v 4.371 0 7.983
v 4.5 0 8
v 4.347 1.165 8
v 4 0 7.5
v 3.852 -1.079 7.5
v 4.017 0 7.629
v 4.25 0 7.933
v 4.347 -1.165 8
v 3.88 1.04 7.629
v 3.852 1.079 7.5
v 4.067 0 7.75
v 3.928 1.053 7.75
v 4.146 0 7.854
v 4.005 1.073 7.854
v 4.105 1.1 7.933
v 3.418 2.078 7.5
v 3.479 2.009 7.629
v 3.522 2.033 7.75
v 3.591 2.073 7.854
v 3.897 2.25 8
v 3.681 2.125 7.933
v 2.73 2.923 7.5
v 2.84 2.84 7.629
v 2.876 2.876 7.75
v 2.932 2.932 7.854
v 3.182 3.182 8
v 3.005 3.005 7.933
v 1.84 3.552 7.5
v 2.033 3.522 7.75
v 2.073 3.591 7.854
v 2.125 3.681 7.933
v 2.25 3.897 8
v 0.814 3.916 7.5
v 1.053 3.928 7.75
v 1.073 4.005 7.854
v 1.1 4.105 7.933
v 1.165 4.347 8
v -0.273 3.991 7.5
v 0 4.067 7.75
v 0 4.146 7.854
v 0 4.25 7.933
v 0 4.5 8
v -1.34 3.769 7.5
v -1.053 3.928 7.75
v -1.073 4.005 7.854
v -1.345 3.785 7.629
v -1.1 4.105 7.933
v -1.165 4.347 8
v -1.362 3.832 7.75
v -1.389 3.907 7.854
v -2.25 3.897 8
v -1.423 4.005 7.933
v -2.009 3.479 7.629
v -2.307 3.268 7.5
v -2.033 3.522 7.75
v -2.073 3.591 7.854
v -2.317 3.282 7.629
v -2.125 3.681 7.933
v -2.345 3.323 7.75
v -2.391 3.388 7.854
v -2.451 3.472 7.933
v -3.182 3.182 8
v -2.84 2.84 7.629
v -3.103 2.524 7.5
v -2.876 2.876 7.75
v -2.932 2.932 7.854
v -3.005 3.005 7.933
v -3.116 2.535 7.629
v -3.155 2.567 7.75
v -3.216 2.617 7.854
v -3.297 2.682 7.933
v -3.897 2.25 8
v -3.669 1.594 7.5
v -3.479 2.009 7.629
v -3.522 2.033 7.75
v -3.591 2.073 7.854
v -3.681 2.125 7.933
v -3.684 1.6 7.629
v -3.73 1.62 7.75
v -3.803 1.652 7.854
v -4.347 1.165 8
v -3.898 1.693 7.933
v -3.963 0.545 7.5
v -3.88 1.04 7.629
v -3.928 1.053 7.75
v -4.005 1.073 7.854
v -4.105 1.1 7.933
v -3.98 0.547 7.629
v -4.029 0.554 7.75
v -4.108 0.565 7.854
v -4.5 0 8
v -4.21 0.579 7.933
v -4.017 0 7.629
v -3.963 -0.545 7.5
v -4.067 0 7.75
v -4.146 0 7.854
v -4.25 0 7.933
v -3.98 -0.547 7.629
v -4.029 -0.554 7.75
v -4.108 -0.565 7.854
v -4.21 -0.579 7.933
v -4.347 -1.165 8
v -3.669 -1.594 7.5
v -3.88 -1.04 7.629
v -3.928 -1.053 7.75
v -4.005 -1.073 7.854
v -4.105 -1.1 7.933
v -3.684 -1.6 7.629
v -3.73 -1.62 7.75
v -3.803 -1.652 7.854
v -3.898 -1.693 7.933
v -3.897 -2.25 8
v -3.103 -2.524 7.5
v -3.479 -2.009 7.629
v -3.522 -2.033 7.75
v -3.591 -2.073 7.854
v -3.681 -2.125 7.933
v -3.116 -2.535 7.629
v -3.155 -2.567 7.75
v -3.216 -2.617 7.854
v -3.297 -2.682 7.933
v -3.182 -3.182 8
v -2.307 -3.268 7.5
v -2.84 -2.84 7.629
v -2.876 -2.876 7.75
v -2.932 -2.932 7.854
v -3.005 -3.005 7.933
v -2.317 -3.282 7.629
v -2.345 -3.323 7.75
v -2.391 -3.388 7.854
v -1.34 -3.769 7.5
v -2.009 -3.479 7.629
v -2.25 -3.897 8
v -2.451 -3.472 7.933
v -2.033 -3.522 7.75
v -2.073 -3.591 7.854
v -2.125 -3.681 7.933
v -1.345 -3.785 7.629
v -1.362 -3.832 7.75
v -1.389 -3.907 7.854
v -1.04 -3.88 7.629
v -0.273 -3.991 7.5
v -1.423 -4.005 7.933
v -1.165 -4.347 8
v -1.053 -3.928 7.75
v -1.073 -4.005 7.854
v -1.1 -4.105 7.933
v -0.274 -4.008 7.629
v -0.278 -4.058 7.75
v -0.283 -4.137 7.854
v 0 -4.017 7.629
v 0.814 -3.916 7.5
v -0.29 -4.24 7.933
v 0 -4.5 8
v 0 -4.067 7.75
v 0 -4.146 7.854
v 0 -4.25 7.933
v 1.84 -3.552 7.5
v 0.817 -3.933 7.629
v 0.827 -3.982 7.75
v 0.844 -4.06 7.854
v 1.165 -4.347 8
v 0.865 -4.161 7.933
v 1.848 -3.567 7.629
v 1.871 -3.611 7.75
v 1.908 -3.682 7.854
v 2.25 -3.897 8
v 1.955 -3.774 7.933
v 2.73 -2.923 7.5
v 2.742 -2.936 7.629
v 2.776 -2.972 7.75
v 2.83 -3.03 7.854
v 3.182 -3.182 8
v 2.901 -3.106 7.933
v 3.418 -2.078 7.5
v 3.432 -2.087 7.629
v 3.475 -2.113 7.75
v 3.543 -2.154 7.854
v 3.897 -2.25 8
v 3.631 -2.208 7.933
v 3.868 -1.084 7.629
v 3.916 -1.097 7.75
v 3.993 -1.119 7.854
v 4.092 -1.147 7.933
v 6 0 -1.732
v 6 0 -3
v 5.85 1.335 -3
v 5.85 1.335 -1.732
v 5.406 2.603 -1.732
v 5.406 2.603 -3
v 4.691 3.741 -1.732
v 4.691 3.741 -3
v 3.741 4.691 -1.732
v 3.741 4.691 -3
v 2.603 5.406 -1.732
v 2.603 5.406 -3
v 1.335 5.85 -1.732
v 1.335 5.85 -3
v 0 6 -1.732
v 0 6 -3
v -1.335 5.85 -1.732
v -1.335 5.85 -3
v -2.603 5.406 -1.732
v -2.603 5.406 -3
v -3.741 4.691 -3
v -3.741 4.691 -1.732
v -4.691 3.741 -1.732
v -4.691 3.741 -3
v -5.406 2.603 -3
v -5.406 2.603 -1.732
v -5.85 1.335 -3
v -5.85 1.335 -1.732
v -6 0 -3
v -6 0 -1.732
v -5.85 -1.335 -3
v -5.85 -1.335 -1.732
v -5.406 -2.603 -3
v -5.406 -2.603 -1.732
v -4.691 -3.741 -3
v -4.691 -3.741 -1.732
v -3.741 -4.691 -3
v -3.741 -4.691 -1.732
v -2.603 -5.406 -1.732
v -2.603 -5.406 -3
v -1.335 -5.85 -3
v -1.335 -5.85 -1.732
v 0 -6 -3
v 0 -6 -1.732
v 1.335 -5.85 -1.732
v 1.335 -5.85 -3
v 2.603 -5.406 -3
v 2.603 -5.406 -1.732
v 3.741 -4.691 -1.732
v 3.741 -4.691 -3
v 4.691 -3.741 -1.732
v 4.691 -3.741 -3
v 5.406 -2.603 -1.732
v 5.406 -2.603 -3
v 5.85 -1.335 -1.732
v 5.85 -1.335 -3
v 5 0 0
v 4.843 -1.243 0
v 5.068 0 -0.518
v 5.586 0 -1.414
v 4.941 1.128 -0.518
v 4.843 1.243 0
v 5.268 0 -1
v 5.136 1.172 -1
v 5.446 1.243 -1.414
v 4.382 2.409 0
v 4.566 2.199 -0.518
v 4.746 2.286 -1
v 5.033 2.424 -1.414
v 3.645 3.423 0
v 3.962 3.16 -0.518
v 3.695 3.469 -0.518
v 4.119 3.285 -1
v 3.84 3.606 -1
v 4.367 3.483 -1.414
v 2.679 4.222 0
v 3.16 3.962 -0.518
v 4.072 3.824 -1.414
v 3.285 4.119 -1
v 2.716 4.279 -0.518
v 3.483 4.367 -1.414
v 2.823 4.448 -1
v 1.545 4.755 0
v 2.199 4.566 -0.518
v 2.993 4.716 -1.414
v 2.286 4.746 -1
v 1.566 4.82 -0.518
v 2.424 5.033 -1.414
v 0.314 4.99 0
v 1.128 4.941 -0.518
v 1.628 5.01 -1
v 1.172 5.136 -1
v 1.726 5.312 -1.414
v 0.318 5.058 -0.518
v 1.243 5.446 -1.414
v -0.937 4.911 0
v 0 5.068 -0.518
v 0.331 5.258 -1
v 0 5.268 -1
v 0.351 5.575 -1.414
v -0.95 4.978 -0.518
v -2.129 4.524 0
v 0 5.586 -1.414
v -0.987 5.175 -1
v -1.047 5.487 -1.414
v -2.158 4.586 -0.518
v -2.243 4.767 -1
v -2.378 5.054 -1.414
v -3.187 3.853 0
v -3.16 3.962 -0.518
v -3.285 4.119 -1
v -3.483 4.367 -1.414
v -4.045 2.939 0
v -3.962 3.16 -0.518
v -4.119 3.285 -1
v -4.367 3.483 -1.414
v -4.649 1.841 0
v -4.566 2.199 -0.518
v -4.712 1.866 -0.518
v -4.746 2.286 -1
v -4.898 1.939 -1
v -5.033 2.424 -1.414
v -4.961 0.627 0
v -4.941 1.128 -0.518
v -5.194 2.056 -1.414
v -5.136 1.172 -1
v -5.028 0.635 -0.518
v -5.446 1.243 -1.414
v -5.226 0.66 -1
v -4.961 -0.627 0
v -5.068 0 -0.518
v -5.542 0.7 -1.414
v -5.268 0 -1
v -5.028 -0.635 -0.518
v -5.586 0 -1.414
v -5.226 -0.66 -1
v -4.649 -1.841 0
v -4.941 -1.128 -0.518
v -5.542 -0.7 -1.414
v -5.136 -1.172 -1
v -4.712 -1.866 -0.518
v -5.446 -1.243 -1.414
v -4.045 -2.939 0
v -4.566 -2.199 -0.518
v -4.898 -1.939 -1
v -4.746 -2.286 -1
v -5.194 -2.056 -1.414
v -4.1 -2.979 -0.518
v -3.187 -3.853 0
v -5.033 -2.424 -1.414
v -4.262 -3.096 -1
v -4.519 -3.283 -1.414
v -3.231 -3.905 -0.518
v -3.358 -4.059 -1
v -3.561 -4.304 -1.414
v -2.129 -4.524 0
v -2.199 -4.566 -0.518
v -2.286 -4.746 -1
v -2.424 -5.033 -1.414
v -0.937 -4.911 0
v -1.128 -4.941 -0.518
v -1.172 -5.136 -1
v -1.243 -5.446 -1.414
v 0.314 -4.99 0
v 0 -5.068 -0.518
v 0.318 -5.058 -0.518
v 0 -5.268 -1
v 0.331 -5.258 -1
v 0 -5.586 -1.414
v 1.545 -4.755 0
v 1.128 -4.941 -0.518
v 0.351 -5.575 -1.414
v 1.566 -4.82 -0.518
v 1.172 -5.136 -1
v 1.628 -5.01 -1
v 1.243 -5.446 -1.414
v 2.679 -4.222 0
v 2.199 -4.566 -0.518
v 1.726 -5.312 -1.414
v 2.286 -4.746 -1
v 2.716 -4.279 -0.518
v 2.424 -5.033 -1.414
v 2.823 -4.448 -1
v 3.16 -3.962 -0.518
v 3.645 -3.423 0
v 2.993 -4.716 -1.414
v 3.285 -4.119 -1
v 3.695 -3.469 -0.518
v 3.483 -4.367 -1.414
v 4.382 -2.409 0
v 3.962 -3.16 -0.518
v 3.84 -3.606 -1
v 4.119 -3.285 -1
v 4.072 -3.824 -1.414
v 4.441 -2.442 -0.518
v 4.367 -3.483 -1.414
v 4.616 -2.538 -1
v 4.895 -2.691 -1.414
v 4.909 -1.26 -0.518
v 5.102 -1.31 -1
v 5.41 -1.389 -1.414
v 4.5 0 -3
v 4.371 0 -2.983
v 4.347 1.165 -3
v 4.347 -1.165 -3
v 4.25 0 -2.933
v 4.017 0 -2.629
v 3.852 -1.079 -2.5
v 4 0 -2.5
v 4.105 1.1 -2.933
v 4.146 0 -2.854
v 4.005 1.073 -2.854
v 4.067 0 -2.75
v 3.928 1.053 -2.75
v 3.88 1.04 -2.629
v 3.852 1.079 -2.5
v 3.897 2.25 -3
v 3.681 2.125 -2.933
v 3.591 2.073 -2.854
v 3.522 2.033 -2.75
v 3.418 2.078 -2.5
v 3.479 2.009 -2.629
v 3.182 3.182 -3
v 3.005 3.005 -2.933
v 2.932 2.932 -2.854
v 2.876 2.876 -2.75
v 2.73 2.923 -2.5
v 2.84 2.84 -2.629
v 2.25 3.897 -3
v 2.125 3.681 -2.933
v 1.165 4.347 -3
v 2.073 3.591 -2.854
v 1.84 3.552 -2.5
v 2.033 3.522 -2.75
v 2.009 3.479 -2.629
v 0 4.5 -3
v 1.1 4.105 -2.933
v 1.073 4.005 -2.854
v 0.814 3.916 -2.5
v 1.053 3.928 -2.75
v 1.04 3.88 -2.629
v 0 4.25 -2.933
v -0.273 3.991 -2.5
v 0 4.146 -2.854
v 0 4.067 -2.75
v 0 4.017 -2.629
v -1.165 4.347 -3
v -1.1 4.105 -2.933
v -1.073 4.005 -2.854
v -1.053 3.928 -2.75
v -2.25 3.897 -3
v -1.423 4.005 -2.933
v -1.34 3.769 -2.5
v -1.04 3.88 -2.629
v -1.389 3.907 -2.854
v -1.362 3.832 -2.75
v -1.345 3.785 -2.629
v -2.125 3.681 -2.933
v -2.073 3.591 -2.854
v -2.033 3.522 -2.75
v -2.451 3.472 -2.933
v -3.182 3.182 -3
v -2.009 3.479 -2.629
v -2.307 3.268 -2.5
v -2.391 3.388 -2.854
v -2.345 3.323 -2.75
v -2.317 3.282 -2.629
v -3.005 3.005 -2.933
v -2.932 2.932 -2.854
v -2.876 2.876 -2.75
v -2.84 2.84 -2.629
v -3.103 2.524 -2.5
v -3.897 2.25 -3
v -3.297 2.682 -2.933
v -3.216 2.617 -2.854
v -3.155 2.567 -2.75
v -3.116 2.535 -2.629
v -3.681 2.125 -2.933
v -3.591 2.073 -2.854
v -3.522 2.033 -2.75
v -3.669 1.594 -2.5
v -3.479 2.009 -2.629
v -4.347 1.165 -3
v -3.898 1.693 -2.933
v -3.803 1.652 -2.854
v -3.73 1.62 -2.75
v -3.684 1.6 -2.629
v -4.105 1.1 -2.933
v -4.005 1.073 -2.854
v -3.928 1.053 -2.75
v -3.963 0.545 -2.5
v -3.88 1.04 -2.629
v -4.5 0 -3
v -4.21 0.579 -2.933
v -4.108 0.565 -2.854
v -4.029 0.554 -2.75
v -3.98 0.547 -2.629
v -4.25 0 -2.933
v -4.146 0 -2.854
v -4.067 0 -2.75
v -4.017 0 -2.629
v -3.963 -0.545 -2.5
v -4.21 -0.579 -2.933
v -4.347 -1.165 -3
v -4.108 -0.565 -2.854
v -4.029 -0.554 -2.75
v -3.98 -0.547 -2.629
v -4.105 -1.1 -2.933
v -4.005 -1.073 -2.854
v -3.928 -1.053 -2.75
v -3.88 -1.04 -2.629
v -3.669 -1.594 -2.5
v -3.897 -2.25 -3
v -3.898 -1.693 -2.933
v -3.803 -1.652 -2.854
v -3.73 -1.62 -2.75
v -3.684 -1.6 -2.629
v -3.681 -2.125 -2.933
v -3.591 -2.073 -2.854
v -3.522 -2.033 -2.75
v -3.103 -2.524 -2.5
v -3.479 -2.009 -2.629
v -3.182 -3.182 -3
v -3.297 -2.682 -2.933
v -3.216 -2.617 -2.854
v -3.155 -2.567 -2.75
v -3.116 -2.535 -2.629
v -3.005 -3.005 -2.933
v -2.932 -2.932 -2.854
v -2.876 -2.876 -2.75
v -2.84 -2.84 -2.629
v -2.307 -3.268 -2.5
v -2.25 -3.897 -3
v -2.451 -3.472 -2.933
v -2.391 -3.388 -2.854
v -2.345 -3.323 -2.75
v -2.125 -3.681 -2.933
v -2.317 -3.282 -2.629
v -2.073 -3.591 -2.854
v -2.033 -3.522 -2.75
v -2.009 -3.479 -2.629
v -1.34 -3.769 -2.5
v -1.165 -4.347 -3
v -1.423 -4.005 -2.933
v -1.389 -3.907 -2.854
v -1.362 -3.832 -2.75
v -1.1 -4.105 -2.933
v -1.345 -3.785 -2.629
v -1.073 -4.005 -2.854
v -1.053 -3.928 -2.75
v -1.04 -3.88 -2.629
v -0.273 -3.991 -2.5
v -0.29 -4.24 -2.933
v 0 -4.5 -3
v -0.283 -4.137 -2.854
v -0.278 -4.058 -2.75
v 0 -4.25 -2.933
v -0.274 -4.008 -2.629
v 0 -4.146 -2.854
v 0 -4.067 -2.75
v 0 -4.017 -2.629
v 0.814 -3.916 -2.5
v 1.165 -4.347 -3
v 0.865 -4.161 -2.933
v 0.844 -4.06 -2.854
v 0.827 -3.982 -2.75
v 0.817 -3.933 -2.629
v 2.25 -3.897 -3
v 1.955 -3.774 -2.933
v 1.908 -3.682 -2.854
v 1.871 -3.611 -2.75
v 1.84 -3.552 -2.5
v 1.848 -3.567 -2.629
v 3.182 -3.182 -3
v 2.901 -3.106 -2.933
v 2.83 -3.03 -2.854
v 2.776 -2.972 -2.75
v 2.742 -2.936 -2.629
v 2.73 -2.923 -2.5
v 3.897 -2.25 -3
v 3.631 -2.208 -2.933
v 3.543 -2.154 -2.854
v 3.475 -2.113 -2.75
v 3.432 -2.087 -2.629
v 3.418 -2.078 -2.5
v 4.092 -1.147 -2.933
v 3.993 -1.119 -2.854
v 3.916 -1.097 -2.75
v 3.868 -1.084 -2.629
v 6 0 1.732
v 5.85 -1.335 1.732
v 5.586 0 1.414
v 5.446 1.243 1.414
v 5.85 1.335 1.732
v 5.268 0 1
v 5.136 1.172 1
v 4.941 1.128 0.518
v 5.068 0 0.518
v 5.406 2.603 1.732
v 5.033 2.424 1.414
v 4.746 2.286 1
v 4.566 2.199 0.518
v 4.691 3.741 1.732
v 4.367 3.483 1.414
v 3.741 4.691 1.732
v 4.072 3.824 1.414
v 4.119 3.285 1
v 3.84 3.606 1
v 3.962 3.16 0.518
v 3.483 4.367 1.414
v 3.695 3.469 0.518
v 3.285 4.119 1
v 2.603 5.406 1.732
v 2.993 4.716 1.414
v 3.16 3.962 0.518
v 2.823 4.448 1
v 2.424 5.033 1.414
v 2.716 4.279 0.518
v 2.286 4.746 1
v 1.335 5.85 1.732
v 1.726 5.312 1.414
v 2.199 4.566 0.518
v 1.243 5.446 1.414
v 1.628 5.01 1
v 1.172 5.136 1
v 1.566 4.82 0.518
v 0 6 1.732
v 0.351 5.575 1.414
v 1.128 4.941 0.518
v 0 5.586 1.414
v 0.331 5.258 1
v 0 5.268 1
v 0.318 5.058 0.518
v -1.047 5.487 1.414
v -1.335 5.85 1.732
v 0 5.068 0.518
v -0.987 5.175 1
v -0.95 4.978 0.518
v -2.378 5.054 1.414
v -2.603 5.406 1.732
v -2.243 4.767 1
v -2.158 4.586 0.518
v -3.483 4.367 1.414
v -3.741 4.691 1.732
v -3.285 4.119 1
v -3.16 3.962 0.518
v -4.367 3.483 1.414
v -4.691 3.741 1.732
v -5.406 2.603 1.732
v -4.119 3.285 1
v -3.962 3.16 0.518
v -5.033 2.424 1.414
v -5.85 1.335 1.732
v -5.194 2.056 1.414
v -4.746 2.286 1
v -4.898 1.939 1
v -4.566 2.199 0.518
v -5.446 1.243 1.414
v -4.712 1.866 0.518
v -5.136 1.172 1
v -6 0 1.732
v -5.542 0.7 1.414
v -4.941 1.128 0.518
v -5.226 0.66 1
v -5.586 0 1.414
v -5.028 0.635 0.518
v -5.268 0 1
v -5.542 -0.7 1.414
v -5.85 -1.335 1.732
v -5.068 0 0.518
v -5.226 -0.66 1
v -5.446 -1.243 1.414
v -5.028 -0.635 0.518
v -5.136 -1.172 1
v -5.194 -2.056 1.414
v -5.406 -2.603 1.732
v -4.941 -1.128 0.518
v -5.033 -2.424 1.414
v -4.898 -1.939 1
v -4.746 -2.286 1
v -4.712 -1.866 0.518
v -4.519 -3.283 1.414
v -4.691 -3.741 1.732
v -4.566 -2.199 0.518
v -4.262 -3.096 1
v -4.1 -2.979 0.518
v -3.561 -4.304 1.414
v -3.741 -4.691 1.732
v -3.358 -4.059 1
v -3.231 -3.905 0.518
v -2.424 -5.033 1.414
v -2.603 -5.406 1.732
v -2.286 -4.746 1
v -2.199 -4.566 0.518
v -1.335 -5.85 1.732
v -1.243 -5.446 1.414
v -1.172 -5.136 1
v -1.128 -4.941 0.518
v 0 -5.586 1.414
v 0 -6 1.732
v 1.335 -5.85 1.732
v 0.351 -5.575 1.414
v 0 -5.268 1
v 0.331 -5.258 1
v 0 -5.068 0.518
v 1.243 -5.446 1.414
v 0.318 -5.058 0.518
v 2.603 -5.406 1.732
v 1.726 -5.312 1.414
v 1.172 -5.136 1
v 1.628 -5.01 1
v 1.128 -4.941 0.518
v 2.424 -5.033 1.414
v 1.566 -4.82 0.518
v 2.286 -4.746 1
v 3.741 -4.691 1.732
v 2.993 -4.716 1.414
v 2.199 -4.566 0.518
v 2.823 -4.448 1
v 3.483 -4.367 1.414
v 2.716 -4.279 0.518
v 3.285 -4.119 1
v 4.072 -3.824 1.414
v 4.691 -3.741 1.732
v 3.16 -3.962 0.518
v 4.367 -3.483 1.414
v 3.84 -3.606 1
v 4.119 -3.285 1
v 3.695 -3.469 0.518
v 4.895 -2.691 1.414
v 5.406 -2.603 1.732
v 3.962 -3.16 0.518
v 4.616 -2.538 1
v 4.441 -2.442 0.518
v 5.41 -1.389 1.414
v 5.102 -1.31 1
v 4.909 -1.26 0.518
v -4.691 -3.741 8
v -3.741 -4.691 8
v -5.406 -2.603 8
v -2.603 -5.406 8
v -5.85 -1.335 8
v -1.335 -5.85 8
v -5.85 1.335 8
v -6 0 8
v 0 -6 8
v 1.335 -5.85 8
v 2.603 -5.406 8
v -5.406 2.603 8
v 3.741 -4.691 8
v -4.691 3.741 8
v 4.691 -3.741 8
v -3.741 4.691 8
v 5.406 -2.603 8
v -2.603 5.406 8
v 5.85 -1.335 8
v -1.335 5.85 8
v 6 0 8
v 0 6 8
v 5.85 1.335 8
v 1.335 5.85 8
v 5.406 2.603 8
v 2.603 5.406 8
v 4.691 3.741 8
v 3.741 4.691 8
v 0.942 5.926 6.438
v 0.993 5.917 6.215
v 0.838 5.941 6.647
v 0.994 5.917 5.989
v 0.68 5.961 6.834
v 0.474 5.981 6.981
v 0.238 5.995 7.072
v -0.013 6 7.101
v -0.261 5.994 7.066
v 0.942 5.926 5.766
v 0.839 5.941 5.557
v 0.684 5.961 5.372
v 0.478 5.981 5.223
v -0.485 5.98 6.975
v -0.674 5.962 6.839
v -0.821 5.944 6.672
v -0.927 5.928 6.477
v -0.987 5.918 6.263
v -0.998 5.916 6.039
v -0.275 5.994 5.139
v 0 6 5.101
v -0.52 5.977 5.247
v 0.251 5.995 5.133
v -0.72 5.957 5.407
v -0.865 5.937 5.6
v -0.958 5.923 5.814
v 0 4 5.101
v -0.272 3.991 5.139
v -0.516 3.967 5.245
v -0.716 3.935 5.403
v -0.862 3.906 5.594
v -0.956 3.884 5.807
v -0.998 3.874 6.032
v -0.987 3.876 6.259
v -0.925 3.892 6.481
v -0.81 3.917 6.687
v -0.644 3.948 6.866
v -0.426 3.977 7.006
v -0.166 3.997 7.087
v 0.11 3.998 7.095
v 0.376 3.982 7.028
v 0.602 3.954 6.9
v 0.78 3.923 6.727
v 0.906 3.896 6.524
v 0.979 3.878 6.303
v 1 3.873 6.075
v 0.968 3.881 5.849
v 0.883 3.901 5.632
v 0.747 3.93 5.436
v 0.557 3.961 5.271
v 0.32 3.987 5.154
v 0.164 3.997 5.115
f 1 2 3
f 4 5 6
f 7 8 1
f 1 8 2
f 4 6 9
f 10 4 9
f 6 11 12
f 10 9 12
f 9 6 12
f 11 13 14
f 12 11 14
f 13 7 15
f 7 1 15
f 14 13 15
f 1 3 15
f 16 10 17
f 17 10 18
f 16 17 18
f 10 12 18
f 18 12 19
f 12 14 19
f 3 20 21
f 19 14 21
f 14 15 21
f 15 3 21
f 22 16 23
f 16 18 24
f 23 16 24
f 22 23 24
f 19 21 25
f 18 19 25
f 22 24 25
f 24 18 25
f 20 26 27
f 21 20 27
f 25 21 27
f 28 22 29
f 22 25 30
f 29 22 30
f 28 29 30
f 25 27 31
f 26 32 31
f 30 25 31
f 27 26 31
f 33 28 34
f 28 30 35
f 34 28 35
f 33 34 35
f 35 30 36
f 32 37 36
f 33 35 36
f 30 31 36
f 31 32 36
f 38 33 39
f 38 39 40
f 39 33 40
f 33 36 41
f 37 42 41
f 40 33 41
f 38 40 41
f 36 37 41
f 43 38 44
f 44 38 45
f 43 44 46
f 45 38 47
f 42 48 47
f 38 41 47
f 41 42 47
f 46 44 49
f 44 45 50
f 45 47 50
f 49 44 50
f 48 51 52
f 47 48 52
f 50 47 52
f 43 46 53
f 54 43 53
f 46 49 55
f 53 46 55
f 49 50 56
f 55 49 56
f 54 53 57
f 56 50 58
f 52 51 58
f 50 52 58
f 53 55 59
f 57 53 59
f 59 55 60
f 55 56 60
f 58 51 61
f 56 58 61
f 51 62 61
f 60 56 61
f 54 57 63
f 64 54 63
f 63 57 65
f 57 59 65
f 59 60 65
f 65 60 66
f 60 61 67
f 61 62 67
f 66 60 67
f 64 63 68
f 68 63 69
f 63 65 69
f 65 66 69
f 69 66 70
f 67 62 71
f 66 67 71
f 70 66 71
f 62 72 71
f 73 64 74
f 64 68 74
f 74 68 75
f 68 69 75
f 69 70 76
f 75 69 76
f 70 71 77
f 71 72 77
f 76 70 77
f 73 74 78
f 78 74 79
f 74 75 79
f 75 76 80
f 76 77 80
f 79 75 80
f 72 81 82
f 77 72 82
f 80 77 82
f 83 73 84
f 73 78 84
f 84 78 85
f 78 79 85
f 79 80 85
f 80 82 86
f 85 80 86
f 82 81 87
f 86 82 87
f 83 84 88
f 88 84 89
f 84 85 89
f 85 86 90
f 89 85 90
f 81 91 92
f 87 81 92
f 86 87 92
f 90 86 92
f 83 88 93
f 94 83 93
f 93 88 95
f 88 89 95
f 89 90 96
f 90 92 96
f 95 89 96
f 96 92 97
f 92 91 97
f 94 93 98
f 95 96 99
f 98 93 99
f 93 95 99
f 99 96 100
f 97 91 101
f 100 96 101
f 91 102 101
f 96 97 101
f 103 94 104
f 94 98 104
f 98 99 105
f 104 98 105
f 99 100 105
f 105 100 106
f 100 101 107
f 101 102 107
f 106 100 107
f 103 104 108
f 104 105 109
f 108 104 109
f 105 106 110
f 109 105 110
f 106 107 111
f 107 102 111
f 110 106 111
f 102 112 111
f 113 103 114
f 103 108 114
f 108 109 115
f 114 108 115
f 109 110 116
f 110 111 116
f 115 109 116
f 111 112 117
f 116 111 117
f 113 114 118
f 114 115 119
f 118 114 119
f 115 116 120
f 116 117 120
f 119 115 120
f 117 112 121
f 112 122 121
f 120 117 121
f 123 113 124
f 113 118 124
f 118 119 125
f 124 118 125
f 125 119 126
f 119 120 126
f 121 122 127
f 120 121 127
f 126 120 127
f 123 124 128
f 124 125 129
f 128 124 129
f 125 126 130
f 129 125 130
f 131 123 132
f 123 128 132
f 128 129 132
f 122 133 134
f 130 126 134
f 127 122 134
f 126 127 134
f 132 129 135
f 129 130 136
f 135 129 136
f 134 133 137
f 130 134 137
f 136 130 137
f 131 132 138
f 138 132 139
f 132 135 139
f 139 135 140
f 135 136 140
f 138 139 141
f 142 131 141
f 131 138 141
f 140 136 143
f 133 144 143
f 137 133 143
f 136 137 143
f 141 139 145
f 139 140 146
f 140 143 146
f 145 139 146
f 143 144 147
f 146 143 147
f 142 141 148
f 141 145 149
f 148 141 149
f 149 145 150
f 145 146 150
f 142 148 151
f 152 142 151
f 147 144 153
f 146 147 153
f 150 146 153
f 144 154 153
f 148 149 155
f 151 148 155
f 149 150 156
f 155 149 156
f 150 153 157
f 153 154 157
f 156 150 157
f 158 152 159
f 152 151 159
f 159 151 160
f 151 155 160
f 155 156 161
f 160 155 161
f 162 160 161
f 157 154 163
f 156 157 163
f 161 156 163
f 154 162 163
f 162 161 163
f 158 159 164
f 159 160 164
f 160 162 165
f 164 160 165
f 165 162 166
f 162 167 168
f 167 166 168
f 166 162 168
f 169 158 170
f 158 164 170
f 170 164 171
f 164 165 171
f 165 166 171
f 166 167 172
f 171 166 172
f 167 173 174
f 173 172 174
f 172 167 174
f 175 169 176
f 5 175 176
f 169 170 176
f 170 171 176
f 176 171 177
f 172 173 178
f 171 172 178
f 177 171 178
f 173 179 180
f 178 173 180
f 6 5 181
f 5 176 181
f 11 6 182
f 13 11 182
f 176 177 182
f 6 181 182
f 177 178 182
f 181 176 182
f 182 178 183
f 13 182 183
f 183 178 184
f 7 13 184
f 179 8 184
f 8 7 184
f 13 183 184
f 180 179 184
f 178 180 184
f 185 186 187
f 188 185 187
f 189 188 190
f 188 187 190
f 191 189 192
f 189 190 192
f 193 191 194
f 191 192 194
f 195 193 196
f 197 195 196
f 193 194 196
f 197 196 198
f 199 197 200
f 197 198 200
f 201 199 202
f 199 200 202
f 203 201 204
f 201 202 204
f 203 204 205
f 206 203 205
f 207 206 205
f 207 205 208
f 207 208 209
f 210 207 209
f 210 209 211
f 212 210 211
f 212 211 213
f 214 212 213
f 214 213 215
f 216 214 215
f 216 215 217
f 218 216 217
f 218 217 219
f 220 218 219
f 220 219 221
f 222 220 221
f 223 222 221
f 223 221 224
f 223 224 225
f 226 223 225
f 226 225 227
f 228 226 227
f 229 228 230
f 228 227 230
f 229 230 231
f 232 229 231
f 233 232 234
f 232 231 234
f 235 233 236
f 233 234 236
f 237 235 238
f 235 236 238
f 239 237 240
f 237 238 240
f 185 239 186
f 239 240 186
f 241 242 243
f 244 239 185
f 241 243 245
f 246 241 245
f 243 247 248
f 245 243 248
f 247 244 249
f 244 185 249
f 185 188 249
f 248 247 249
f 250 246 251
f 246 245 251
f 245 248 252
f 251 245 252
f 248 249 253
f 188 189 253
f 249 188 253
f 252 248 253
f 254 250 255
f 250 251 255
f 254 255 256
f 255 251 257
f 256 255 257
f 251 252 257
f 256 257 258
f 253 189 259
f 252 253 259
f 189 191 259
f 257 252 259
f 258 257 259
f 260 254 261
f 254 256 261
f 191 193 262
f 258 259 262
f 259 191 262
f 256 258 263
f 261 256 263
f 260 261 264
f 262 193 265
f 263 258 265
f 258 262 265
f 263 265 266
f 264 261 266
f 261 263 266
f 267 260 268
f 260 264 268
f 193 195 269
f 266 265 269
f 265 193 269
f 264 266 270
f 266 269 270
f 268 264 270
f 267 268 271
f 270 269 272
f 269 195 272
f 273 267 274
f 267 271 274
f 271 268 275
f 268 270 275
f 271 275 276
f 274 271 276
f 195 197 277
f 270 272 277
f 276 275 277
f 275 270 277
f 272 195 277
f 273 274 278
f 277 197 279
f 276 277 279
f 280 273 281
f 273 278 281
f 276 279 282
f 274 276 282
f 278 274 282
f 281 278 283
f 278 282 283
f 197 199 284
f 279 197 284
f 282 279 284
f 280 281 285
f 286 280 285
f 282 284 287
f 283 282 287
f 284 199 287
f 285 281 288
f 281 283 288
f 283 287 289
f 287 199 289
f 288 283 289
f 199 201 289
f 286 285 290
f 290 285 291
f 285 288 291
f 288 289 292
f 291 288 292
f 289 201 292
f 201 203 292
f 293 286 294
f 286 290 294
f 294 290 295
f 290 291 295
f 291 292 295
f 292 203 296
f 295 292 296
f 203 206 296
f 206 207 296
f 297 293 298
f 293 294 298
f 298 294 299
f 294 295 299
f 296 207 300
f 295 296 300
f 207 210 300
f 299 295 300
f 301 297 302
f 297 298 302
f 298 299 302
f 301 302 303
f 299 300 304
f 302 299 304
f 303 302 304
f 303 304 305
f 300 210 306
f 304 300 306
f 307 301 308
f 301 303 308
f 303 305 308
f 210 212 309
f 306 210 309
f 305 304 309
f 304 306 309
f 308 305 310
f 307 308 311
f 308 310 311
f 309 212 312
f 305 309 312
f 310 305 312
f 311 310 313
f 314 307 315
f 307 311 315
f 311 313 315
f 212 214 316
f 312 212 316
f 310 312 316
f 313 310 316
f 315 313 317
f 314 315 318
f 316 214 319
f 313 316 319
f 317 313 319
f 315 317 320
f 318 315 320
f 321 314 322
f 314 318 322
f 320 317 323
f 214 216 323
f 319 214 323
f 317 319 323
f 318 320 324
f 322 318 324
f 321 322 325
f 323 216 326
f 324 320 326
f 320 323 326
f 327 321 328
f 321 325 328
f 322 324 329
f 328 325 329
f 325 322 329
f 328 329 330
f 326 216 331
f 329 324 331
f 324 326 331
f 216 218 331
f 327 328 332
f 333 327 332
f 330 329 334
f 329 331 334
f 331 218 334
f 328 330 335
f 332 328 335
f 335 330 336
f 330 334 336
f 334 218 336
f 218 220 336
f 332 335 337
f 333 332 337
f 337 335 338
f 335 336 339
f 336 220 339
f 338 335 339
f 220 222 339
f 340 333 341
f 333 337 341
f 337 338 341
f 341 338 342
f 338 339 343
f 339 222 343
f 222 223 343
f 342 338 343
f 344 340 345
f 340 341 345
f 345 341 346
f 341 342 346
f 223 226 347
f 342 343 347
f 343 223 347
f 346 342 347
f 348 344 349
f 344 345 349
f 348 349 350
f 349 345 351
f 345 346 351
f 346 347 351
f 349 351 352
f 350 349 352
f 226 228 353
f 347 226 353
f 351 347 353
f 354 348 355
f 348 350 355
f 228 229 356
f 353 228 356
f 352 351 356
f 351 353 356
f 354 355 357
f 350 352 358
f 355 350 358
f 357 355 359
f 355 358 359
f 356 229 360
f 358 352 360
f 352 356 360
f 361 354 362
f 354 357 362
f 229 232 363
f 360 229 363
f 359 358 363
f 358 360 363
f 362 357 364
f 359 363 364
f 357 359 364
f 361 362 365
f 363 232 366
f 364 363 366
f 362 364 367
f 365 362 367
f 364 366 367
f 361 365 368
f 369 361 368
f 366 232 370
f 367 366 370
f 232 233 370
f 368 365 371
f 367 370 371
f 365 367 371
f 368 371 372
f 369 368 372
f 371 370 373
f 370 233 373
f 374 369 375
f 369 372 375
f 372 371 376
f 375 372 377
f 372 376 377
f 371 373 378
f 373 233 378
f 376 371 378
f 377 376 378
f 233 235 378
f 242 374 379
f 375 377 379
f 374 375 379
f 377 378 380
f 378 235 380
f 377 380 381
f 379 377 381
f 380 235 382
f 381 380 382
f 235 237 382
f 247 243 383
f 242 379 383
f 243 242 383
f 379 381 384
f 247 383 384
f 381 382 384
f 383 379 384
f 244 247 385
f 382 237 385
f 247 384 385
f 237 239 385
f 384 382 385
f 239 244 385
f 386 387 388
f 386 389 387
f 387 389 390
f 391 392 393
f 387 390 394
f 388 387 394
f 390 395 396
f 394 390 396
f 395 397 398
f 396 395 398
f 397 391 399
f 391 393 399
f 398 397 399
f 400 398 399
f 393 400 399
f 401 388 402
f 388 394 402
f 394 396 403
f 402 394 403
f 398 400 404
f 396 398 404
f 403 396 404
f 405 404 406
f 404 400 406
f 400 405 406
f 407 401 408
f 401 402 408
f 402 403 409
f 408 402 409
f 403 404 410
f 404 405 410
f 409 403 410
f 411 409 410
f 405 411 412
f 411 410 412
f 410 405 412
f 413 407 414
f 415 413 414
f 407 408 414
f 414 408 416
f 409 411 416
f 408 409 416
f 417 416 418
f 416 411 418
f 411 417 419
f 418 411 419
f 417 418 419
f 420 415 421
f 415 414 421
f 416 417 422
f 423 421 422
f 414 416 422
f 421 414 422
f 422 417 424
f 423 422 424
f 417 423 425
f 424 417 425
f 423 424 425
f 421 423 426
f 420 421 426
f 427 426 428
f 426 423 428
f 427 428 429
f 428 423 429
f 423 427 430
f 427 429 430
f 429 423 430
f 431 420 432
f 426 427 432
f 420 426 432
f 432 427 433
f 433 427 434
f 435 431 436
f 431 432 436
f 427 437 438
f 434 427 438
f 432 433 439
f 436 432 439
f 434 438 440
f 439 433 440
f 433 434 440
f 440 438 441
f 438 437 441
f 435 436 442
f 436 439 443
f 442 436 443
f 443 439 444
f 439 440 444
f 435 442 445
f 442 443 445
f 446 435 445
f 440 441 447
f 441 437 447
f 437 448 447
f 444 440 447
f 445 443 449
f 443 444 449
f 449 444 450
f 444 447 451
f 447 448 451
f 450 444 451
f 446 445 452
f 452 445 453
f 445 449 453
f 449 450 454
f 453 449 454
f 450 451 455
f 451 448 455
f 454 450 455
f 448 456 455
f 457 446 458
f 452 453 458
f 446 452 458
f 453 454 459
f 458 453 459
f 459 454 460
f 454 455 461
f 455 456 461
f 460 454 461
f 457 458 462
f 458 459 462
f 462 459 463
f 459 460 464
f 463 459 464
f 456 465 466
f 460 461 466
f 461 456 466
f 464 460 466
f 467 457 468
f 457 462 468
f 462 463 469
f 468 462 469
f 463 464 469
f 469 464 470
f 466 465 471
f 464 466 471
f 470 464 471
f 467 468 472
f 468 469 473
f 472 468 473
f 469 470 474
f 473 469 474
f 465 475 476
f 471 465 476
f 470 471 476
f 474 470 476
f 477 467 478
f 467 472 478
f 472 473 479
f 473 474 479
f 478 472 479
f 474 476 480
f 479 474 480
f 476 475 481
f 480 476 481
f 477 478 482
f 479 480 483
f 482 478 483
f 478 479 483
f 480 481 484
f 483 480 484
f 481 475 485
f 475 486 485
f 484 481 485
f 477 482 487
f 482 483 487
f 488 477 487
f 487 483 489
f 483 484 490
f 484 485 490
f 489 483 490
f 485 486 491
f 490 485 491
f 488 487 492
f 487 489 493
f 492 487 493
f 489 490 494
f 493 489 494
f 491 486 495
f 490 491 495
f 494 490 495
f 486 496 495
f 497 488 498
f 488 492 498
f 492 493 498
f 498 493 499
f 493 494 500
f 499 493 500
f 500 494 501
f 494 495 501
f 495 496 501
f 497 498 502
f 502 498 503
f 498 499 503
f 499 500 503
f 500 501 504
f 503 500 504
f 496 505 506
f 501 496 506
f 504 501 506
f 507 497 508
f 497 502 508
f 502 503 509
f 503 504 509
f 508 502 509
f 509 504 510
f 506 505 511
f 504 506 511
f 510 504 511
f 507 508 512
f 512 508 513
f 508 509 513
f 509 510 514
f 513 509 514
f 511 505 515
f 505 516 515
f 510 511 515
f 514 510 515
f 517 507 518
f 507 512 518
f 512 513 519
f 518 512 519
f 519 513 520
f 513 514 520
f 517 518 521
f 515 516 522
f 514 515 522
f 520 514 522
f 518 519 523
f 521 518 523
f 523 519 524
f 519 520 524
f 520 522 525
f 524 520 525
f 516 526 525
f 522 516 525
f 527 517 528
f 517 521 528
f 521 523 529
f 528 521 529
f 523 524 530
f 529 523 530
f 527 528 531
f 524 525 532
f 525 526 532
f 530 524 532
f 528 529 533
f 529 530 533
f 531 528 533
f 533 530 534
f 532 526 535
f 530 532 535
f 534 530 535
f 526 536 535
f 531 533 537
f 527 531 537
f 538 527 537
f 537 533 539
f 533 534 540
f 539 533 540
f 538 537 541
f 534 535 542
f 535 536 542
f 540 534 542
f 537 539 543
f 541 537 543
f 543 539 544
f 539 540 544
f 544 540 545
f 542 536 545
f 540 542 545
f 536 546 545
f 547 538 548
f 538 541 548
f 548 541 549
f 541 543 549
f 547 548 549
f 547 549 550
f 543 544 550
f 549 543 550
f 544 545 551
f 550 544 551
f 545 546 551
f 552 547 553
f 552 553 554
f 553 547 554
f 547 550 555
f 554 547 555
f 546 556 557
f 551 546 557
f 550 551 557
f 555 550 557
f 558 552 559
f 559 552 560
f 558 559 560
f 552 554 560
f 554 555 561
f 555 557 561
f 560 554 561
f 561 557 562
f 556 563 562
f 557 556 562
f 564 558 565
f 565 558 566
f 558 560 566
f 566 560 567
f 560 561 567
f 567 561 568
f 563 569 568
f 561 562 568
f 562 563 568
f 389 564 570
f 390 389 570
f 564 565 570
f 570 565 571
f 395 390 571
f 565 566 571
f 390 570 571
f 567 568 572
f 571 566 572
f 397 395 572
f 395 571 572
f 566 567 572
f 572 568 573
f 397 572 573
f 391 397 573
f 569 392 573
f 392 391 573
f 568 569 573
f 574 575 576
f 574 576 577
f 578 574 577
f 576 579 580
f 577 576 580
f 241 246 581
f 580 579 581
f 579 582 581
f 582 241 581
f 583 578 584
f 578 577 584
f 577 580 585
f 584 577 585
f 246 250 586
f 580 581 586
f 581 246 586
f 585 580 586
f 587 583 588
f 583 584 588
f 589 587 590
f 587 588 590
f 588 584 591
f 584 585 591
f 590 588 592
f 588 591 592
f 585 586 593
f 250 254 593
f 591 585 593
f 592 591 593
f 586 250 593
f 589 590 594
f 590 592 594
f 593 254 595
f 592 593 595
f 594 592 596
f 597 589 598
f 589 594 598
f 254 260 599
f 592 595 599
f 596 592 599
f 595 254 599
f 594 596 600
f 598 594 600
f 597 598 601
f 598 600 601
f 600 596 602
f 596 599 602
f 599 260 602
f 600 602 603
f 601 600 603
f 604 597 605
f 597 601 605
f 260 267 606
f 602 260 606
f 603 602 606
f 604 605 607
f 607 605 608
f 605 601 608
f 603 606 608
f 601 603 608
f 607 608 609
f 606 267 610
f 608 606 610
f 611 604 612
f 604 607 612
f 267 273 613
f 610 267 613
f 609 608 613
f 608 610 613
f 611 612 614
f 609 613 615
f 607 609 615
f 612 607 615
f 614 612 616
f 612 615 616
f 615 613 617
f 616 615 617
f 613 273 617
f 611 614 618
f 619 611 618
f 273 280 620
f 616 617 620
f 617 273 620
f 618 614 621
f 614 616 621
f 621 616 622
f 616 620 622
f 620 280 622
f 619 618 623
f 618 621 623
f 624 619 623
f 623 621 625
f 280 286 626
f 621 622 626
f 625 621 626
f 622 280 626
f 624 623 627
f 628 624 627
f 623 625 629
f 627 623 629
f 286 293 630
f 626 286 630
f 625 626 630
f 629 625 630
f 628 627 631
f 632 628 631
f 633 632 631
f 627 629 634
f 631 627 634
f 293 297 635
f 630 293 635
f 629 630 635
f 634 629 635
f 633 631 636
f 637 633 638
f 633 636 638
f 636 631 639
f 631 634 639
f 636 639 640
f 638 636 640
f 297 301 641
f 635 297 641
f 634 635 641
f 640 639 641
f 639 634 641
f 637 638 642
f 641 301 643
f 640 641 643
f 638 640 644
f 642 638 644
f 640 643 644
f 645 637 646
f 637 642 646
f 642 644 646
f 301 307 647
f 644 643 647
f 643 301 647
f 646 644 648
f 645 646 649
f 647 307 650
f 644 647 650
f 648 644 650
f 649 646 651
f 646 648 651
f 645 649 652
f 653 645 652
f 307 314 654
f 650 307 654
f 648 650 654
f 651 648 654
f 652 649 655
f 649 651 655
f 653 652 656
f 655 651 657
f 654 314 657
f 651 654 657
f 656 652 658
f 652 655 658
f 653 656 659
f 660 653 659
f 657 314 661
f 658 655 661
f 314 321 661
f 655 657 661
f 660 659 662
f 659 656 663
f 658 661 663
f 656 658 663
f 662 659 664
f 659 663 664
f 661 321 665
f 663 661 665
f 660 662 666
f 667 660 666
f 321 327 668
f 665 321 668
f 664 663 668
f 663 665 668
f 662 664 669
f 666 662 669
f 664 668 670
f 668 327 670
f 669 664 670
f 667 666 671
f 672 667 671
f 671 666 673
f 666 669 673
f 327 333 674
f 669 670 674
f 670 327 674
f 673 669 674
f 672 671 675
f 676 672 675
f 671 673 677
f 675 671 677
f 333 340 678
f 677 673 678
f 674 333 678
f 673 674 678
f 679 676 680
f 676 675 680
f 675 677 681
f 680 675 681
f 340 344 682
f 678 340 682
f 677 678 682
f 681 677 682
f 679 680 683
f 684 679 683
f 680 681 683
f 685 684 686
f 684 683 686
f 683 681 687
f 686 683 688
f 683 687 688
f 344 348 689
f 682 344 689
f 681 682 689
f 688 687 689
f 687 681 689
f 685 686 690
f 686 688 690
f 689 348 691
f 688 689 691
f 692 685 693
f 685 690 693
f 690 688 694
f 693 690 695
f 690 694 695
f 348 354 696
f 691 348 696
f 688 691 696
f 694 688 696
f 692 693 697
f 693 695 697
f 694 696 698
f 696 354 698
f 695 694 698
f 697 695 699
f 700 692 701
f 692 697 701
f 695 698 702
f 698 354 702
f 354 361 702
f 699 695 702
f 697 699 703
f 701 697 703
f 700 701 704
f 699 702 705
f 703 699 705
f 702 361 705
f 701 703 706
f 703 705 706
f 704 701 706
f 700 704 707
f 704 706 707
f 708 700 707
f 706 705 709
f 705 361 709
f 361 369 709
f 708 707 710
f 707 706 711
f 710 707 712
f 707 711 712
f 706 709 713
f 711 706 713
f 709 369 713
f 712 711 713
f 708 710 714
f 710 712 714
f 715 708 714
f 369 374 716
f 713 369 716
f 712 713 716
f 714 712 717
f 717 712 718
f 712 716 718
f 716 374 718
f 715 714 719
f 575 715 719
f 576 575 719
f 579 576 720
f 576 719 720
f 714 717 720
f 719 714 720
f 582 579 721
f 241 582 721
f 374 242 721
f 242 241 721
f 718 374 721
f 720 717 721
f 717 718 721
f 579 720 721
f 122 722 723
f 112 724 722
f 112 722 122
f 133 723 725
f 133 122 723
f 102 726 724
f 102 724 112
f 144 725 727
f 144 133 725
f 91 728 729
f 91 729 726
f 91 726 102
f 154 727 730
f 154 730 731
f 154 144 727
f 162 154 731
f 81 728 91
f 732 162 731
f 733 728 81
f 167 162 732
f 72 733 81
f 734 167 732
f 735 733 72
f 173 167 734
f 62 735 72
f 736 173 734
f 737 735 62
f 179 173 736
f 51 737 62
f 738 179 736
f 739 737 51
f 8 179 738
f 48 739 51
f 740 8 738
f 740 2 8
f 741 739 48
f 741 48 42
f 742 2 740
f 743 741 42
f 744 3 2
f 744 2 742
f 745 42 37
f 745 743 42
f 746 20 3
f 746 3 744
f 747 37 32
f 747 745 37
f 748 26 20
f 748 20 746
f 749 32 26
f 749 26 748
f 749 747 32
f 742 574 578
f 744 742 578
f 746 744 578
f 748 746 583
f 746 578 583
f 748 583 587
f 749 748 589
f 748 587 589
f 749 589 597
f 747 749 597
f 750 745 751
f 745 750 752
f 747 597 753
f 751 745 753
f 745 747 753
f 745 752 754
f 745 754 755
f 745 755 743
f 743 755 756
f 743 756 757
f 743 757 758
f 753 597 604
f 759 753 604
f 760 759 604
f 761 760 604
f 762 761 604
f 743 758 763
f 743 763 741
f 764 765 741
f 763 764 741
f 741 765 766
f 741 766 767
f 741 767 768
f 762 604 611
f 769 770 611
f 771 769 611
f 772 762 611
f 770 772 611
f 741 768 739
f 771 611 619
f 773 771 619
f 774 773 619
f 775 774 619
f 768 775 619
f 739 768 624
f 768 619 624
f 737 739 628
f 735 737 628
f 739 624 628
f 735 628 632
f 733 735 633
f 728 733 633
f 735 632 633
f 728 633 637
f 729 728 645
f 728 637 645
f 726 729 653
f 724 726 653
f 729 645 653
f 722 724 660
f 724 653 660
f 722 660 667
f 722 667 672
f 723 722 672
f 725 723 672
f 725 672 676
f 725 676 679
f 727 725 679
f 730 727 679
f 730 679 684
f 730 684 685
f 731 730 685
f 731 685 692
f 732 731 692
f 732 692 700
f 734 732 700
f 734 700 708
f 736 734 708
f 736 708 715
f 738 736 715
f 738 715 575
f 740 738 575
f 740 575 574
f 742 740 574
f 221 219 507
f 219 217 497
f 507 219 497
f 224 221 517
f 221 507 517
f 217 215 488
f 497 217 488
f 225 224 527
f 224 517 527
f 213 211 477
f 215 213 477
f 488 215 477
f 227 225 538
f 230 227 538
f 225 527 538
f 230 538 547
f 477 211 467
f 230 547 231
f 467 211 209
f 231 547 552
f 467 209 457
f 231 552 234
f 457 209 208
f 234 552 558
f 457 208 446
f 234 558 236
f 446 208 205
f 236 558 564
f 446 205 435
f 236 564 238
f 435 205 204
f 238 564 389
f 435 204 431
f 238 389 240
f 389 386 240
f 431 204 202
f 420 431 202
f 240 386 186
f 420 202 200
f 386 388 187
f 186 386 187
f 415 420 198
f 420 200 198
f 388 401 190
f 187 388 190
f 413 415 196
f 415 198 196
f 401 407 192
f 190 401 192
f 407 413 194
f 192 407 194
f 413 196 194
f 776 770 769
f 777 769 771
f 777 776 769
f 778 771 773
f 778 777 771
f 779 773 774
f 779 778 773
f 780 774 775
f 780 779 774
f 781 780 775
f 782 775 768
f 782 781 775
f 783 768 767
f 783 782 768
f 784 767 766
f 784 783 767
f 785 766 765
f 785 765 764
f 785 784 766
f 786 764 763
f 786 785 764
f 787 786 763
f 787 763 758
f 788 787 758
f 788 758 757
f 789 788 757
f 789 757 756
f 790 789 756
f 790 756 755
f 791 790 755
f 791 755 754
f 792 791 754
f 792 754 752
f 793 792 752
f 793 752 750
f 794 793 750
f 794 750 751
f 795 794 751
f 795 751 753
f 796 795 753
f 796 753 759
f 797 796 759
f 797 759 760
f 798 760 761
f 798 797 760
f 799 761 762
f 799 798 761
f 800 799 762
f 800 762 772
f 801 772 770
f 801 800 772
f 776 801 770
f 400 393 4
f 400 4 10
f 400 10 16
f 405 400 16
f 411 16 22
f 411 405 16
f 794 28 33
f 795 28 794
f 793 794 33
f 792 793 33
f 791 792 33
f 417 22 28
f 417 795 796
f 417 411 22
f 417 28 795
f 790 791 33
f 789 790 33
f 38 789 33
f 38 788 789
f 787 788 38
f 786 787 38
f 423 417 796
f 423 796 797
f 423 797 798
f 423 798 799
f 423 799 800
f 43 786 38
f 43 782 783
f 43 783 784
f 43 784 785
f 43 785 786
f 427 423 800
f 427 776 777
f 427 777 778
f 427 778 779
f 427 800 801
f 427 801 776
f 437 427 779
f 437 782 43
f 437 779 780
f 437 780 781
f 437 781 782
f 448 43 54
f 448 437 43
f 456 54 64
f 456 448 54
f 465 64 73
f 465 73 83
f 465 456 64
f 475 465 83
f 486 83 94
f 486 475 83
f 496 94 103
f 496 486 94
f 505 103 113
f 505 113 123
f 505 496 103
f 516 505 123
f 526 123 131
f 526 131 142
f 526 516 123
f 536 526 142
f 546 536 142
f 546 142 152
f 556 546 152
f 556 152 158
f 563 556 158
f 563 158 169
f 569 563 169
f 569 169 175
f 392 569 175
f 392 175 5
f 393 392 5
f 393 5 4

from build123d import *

# Parameters (mm, degrees)
BOSS_EXTRUDE1_DEPTH      = 8
BOSS_EXTRUDE1_DEPTH_BACK = 3
SKETCH1_R                = 6
SKETCH1_R_2              = 4
SKETCH3_R                = 2
FILLET1_R                = 0.5
SKETCH4_R                = 1
CUT_EXTRUDE2_DEPTH       = 12.66190379


with BuildPart() as part:
    # Sketch1 → Boss-Extrude1 (new, two sides: drawn at the far end of the back side and taken through both)
    with BuildSketch(Plane.XY.offset(-BOSS_EXTRUDE1_DEPTH_BACK)):
        Circle(SKETCH1_R)
        Circle(SKETCH1_R_2, mode=Mode.SUBTRACT)
    extrude(amount=BOSS_EXTRUDE1_DEPTH + BOSS_EXTRUDE1_DEPTH_BACK)

    # Sketch3 → Cut-Revolve1 (revolve, cut)
    with BuildSketch(Plane(origin=(0, 0, 0), x_dir=(1, 0, 0), z_dir=(0, 1, 0)), mode=Mode.PRIVATE) as cut_revolve1_sk:
        with Locations((-7, 0)):
            Circle(SKETCH3_R)
    revolve(cut_revolve1_sk.sketch.rotate(Axis((0, 0, -3.036308444), (0, 0, 1)), 180), axis=Axis((0, 0, -3.036308444), (0, 0, 1)), mode=Mode.SUBTRACT)

    # Fillet1
    fillet1_edges = [part.edges().sort_by_distance(p)[0] for p in [
        (-4, 0, -3),
        (-4, 0, 8),
    ]]
    fillet(fillet1_edges, radius=FILLET1_R)

    # Sketch4 → Cut-Extrude2 (cut, through all)
    with BuildSketch(Plane(origin=(0, 0, 0), x_dir=(1, 0, 0), z_dir=(0, 1, 0))):
        with Locations(Location((0, -6.101025888, 0), (0, 0, 90))):
            Circle(SKETCH4_R)
    extrude(amount=CUT_EXTRUDE2_DEPTH, mode=Mode.SUBTRACT)


solid = part.part
